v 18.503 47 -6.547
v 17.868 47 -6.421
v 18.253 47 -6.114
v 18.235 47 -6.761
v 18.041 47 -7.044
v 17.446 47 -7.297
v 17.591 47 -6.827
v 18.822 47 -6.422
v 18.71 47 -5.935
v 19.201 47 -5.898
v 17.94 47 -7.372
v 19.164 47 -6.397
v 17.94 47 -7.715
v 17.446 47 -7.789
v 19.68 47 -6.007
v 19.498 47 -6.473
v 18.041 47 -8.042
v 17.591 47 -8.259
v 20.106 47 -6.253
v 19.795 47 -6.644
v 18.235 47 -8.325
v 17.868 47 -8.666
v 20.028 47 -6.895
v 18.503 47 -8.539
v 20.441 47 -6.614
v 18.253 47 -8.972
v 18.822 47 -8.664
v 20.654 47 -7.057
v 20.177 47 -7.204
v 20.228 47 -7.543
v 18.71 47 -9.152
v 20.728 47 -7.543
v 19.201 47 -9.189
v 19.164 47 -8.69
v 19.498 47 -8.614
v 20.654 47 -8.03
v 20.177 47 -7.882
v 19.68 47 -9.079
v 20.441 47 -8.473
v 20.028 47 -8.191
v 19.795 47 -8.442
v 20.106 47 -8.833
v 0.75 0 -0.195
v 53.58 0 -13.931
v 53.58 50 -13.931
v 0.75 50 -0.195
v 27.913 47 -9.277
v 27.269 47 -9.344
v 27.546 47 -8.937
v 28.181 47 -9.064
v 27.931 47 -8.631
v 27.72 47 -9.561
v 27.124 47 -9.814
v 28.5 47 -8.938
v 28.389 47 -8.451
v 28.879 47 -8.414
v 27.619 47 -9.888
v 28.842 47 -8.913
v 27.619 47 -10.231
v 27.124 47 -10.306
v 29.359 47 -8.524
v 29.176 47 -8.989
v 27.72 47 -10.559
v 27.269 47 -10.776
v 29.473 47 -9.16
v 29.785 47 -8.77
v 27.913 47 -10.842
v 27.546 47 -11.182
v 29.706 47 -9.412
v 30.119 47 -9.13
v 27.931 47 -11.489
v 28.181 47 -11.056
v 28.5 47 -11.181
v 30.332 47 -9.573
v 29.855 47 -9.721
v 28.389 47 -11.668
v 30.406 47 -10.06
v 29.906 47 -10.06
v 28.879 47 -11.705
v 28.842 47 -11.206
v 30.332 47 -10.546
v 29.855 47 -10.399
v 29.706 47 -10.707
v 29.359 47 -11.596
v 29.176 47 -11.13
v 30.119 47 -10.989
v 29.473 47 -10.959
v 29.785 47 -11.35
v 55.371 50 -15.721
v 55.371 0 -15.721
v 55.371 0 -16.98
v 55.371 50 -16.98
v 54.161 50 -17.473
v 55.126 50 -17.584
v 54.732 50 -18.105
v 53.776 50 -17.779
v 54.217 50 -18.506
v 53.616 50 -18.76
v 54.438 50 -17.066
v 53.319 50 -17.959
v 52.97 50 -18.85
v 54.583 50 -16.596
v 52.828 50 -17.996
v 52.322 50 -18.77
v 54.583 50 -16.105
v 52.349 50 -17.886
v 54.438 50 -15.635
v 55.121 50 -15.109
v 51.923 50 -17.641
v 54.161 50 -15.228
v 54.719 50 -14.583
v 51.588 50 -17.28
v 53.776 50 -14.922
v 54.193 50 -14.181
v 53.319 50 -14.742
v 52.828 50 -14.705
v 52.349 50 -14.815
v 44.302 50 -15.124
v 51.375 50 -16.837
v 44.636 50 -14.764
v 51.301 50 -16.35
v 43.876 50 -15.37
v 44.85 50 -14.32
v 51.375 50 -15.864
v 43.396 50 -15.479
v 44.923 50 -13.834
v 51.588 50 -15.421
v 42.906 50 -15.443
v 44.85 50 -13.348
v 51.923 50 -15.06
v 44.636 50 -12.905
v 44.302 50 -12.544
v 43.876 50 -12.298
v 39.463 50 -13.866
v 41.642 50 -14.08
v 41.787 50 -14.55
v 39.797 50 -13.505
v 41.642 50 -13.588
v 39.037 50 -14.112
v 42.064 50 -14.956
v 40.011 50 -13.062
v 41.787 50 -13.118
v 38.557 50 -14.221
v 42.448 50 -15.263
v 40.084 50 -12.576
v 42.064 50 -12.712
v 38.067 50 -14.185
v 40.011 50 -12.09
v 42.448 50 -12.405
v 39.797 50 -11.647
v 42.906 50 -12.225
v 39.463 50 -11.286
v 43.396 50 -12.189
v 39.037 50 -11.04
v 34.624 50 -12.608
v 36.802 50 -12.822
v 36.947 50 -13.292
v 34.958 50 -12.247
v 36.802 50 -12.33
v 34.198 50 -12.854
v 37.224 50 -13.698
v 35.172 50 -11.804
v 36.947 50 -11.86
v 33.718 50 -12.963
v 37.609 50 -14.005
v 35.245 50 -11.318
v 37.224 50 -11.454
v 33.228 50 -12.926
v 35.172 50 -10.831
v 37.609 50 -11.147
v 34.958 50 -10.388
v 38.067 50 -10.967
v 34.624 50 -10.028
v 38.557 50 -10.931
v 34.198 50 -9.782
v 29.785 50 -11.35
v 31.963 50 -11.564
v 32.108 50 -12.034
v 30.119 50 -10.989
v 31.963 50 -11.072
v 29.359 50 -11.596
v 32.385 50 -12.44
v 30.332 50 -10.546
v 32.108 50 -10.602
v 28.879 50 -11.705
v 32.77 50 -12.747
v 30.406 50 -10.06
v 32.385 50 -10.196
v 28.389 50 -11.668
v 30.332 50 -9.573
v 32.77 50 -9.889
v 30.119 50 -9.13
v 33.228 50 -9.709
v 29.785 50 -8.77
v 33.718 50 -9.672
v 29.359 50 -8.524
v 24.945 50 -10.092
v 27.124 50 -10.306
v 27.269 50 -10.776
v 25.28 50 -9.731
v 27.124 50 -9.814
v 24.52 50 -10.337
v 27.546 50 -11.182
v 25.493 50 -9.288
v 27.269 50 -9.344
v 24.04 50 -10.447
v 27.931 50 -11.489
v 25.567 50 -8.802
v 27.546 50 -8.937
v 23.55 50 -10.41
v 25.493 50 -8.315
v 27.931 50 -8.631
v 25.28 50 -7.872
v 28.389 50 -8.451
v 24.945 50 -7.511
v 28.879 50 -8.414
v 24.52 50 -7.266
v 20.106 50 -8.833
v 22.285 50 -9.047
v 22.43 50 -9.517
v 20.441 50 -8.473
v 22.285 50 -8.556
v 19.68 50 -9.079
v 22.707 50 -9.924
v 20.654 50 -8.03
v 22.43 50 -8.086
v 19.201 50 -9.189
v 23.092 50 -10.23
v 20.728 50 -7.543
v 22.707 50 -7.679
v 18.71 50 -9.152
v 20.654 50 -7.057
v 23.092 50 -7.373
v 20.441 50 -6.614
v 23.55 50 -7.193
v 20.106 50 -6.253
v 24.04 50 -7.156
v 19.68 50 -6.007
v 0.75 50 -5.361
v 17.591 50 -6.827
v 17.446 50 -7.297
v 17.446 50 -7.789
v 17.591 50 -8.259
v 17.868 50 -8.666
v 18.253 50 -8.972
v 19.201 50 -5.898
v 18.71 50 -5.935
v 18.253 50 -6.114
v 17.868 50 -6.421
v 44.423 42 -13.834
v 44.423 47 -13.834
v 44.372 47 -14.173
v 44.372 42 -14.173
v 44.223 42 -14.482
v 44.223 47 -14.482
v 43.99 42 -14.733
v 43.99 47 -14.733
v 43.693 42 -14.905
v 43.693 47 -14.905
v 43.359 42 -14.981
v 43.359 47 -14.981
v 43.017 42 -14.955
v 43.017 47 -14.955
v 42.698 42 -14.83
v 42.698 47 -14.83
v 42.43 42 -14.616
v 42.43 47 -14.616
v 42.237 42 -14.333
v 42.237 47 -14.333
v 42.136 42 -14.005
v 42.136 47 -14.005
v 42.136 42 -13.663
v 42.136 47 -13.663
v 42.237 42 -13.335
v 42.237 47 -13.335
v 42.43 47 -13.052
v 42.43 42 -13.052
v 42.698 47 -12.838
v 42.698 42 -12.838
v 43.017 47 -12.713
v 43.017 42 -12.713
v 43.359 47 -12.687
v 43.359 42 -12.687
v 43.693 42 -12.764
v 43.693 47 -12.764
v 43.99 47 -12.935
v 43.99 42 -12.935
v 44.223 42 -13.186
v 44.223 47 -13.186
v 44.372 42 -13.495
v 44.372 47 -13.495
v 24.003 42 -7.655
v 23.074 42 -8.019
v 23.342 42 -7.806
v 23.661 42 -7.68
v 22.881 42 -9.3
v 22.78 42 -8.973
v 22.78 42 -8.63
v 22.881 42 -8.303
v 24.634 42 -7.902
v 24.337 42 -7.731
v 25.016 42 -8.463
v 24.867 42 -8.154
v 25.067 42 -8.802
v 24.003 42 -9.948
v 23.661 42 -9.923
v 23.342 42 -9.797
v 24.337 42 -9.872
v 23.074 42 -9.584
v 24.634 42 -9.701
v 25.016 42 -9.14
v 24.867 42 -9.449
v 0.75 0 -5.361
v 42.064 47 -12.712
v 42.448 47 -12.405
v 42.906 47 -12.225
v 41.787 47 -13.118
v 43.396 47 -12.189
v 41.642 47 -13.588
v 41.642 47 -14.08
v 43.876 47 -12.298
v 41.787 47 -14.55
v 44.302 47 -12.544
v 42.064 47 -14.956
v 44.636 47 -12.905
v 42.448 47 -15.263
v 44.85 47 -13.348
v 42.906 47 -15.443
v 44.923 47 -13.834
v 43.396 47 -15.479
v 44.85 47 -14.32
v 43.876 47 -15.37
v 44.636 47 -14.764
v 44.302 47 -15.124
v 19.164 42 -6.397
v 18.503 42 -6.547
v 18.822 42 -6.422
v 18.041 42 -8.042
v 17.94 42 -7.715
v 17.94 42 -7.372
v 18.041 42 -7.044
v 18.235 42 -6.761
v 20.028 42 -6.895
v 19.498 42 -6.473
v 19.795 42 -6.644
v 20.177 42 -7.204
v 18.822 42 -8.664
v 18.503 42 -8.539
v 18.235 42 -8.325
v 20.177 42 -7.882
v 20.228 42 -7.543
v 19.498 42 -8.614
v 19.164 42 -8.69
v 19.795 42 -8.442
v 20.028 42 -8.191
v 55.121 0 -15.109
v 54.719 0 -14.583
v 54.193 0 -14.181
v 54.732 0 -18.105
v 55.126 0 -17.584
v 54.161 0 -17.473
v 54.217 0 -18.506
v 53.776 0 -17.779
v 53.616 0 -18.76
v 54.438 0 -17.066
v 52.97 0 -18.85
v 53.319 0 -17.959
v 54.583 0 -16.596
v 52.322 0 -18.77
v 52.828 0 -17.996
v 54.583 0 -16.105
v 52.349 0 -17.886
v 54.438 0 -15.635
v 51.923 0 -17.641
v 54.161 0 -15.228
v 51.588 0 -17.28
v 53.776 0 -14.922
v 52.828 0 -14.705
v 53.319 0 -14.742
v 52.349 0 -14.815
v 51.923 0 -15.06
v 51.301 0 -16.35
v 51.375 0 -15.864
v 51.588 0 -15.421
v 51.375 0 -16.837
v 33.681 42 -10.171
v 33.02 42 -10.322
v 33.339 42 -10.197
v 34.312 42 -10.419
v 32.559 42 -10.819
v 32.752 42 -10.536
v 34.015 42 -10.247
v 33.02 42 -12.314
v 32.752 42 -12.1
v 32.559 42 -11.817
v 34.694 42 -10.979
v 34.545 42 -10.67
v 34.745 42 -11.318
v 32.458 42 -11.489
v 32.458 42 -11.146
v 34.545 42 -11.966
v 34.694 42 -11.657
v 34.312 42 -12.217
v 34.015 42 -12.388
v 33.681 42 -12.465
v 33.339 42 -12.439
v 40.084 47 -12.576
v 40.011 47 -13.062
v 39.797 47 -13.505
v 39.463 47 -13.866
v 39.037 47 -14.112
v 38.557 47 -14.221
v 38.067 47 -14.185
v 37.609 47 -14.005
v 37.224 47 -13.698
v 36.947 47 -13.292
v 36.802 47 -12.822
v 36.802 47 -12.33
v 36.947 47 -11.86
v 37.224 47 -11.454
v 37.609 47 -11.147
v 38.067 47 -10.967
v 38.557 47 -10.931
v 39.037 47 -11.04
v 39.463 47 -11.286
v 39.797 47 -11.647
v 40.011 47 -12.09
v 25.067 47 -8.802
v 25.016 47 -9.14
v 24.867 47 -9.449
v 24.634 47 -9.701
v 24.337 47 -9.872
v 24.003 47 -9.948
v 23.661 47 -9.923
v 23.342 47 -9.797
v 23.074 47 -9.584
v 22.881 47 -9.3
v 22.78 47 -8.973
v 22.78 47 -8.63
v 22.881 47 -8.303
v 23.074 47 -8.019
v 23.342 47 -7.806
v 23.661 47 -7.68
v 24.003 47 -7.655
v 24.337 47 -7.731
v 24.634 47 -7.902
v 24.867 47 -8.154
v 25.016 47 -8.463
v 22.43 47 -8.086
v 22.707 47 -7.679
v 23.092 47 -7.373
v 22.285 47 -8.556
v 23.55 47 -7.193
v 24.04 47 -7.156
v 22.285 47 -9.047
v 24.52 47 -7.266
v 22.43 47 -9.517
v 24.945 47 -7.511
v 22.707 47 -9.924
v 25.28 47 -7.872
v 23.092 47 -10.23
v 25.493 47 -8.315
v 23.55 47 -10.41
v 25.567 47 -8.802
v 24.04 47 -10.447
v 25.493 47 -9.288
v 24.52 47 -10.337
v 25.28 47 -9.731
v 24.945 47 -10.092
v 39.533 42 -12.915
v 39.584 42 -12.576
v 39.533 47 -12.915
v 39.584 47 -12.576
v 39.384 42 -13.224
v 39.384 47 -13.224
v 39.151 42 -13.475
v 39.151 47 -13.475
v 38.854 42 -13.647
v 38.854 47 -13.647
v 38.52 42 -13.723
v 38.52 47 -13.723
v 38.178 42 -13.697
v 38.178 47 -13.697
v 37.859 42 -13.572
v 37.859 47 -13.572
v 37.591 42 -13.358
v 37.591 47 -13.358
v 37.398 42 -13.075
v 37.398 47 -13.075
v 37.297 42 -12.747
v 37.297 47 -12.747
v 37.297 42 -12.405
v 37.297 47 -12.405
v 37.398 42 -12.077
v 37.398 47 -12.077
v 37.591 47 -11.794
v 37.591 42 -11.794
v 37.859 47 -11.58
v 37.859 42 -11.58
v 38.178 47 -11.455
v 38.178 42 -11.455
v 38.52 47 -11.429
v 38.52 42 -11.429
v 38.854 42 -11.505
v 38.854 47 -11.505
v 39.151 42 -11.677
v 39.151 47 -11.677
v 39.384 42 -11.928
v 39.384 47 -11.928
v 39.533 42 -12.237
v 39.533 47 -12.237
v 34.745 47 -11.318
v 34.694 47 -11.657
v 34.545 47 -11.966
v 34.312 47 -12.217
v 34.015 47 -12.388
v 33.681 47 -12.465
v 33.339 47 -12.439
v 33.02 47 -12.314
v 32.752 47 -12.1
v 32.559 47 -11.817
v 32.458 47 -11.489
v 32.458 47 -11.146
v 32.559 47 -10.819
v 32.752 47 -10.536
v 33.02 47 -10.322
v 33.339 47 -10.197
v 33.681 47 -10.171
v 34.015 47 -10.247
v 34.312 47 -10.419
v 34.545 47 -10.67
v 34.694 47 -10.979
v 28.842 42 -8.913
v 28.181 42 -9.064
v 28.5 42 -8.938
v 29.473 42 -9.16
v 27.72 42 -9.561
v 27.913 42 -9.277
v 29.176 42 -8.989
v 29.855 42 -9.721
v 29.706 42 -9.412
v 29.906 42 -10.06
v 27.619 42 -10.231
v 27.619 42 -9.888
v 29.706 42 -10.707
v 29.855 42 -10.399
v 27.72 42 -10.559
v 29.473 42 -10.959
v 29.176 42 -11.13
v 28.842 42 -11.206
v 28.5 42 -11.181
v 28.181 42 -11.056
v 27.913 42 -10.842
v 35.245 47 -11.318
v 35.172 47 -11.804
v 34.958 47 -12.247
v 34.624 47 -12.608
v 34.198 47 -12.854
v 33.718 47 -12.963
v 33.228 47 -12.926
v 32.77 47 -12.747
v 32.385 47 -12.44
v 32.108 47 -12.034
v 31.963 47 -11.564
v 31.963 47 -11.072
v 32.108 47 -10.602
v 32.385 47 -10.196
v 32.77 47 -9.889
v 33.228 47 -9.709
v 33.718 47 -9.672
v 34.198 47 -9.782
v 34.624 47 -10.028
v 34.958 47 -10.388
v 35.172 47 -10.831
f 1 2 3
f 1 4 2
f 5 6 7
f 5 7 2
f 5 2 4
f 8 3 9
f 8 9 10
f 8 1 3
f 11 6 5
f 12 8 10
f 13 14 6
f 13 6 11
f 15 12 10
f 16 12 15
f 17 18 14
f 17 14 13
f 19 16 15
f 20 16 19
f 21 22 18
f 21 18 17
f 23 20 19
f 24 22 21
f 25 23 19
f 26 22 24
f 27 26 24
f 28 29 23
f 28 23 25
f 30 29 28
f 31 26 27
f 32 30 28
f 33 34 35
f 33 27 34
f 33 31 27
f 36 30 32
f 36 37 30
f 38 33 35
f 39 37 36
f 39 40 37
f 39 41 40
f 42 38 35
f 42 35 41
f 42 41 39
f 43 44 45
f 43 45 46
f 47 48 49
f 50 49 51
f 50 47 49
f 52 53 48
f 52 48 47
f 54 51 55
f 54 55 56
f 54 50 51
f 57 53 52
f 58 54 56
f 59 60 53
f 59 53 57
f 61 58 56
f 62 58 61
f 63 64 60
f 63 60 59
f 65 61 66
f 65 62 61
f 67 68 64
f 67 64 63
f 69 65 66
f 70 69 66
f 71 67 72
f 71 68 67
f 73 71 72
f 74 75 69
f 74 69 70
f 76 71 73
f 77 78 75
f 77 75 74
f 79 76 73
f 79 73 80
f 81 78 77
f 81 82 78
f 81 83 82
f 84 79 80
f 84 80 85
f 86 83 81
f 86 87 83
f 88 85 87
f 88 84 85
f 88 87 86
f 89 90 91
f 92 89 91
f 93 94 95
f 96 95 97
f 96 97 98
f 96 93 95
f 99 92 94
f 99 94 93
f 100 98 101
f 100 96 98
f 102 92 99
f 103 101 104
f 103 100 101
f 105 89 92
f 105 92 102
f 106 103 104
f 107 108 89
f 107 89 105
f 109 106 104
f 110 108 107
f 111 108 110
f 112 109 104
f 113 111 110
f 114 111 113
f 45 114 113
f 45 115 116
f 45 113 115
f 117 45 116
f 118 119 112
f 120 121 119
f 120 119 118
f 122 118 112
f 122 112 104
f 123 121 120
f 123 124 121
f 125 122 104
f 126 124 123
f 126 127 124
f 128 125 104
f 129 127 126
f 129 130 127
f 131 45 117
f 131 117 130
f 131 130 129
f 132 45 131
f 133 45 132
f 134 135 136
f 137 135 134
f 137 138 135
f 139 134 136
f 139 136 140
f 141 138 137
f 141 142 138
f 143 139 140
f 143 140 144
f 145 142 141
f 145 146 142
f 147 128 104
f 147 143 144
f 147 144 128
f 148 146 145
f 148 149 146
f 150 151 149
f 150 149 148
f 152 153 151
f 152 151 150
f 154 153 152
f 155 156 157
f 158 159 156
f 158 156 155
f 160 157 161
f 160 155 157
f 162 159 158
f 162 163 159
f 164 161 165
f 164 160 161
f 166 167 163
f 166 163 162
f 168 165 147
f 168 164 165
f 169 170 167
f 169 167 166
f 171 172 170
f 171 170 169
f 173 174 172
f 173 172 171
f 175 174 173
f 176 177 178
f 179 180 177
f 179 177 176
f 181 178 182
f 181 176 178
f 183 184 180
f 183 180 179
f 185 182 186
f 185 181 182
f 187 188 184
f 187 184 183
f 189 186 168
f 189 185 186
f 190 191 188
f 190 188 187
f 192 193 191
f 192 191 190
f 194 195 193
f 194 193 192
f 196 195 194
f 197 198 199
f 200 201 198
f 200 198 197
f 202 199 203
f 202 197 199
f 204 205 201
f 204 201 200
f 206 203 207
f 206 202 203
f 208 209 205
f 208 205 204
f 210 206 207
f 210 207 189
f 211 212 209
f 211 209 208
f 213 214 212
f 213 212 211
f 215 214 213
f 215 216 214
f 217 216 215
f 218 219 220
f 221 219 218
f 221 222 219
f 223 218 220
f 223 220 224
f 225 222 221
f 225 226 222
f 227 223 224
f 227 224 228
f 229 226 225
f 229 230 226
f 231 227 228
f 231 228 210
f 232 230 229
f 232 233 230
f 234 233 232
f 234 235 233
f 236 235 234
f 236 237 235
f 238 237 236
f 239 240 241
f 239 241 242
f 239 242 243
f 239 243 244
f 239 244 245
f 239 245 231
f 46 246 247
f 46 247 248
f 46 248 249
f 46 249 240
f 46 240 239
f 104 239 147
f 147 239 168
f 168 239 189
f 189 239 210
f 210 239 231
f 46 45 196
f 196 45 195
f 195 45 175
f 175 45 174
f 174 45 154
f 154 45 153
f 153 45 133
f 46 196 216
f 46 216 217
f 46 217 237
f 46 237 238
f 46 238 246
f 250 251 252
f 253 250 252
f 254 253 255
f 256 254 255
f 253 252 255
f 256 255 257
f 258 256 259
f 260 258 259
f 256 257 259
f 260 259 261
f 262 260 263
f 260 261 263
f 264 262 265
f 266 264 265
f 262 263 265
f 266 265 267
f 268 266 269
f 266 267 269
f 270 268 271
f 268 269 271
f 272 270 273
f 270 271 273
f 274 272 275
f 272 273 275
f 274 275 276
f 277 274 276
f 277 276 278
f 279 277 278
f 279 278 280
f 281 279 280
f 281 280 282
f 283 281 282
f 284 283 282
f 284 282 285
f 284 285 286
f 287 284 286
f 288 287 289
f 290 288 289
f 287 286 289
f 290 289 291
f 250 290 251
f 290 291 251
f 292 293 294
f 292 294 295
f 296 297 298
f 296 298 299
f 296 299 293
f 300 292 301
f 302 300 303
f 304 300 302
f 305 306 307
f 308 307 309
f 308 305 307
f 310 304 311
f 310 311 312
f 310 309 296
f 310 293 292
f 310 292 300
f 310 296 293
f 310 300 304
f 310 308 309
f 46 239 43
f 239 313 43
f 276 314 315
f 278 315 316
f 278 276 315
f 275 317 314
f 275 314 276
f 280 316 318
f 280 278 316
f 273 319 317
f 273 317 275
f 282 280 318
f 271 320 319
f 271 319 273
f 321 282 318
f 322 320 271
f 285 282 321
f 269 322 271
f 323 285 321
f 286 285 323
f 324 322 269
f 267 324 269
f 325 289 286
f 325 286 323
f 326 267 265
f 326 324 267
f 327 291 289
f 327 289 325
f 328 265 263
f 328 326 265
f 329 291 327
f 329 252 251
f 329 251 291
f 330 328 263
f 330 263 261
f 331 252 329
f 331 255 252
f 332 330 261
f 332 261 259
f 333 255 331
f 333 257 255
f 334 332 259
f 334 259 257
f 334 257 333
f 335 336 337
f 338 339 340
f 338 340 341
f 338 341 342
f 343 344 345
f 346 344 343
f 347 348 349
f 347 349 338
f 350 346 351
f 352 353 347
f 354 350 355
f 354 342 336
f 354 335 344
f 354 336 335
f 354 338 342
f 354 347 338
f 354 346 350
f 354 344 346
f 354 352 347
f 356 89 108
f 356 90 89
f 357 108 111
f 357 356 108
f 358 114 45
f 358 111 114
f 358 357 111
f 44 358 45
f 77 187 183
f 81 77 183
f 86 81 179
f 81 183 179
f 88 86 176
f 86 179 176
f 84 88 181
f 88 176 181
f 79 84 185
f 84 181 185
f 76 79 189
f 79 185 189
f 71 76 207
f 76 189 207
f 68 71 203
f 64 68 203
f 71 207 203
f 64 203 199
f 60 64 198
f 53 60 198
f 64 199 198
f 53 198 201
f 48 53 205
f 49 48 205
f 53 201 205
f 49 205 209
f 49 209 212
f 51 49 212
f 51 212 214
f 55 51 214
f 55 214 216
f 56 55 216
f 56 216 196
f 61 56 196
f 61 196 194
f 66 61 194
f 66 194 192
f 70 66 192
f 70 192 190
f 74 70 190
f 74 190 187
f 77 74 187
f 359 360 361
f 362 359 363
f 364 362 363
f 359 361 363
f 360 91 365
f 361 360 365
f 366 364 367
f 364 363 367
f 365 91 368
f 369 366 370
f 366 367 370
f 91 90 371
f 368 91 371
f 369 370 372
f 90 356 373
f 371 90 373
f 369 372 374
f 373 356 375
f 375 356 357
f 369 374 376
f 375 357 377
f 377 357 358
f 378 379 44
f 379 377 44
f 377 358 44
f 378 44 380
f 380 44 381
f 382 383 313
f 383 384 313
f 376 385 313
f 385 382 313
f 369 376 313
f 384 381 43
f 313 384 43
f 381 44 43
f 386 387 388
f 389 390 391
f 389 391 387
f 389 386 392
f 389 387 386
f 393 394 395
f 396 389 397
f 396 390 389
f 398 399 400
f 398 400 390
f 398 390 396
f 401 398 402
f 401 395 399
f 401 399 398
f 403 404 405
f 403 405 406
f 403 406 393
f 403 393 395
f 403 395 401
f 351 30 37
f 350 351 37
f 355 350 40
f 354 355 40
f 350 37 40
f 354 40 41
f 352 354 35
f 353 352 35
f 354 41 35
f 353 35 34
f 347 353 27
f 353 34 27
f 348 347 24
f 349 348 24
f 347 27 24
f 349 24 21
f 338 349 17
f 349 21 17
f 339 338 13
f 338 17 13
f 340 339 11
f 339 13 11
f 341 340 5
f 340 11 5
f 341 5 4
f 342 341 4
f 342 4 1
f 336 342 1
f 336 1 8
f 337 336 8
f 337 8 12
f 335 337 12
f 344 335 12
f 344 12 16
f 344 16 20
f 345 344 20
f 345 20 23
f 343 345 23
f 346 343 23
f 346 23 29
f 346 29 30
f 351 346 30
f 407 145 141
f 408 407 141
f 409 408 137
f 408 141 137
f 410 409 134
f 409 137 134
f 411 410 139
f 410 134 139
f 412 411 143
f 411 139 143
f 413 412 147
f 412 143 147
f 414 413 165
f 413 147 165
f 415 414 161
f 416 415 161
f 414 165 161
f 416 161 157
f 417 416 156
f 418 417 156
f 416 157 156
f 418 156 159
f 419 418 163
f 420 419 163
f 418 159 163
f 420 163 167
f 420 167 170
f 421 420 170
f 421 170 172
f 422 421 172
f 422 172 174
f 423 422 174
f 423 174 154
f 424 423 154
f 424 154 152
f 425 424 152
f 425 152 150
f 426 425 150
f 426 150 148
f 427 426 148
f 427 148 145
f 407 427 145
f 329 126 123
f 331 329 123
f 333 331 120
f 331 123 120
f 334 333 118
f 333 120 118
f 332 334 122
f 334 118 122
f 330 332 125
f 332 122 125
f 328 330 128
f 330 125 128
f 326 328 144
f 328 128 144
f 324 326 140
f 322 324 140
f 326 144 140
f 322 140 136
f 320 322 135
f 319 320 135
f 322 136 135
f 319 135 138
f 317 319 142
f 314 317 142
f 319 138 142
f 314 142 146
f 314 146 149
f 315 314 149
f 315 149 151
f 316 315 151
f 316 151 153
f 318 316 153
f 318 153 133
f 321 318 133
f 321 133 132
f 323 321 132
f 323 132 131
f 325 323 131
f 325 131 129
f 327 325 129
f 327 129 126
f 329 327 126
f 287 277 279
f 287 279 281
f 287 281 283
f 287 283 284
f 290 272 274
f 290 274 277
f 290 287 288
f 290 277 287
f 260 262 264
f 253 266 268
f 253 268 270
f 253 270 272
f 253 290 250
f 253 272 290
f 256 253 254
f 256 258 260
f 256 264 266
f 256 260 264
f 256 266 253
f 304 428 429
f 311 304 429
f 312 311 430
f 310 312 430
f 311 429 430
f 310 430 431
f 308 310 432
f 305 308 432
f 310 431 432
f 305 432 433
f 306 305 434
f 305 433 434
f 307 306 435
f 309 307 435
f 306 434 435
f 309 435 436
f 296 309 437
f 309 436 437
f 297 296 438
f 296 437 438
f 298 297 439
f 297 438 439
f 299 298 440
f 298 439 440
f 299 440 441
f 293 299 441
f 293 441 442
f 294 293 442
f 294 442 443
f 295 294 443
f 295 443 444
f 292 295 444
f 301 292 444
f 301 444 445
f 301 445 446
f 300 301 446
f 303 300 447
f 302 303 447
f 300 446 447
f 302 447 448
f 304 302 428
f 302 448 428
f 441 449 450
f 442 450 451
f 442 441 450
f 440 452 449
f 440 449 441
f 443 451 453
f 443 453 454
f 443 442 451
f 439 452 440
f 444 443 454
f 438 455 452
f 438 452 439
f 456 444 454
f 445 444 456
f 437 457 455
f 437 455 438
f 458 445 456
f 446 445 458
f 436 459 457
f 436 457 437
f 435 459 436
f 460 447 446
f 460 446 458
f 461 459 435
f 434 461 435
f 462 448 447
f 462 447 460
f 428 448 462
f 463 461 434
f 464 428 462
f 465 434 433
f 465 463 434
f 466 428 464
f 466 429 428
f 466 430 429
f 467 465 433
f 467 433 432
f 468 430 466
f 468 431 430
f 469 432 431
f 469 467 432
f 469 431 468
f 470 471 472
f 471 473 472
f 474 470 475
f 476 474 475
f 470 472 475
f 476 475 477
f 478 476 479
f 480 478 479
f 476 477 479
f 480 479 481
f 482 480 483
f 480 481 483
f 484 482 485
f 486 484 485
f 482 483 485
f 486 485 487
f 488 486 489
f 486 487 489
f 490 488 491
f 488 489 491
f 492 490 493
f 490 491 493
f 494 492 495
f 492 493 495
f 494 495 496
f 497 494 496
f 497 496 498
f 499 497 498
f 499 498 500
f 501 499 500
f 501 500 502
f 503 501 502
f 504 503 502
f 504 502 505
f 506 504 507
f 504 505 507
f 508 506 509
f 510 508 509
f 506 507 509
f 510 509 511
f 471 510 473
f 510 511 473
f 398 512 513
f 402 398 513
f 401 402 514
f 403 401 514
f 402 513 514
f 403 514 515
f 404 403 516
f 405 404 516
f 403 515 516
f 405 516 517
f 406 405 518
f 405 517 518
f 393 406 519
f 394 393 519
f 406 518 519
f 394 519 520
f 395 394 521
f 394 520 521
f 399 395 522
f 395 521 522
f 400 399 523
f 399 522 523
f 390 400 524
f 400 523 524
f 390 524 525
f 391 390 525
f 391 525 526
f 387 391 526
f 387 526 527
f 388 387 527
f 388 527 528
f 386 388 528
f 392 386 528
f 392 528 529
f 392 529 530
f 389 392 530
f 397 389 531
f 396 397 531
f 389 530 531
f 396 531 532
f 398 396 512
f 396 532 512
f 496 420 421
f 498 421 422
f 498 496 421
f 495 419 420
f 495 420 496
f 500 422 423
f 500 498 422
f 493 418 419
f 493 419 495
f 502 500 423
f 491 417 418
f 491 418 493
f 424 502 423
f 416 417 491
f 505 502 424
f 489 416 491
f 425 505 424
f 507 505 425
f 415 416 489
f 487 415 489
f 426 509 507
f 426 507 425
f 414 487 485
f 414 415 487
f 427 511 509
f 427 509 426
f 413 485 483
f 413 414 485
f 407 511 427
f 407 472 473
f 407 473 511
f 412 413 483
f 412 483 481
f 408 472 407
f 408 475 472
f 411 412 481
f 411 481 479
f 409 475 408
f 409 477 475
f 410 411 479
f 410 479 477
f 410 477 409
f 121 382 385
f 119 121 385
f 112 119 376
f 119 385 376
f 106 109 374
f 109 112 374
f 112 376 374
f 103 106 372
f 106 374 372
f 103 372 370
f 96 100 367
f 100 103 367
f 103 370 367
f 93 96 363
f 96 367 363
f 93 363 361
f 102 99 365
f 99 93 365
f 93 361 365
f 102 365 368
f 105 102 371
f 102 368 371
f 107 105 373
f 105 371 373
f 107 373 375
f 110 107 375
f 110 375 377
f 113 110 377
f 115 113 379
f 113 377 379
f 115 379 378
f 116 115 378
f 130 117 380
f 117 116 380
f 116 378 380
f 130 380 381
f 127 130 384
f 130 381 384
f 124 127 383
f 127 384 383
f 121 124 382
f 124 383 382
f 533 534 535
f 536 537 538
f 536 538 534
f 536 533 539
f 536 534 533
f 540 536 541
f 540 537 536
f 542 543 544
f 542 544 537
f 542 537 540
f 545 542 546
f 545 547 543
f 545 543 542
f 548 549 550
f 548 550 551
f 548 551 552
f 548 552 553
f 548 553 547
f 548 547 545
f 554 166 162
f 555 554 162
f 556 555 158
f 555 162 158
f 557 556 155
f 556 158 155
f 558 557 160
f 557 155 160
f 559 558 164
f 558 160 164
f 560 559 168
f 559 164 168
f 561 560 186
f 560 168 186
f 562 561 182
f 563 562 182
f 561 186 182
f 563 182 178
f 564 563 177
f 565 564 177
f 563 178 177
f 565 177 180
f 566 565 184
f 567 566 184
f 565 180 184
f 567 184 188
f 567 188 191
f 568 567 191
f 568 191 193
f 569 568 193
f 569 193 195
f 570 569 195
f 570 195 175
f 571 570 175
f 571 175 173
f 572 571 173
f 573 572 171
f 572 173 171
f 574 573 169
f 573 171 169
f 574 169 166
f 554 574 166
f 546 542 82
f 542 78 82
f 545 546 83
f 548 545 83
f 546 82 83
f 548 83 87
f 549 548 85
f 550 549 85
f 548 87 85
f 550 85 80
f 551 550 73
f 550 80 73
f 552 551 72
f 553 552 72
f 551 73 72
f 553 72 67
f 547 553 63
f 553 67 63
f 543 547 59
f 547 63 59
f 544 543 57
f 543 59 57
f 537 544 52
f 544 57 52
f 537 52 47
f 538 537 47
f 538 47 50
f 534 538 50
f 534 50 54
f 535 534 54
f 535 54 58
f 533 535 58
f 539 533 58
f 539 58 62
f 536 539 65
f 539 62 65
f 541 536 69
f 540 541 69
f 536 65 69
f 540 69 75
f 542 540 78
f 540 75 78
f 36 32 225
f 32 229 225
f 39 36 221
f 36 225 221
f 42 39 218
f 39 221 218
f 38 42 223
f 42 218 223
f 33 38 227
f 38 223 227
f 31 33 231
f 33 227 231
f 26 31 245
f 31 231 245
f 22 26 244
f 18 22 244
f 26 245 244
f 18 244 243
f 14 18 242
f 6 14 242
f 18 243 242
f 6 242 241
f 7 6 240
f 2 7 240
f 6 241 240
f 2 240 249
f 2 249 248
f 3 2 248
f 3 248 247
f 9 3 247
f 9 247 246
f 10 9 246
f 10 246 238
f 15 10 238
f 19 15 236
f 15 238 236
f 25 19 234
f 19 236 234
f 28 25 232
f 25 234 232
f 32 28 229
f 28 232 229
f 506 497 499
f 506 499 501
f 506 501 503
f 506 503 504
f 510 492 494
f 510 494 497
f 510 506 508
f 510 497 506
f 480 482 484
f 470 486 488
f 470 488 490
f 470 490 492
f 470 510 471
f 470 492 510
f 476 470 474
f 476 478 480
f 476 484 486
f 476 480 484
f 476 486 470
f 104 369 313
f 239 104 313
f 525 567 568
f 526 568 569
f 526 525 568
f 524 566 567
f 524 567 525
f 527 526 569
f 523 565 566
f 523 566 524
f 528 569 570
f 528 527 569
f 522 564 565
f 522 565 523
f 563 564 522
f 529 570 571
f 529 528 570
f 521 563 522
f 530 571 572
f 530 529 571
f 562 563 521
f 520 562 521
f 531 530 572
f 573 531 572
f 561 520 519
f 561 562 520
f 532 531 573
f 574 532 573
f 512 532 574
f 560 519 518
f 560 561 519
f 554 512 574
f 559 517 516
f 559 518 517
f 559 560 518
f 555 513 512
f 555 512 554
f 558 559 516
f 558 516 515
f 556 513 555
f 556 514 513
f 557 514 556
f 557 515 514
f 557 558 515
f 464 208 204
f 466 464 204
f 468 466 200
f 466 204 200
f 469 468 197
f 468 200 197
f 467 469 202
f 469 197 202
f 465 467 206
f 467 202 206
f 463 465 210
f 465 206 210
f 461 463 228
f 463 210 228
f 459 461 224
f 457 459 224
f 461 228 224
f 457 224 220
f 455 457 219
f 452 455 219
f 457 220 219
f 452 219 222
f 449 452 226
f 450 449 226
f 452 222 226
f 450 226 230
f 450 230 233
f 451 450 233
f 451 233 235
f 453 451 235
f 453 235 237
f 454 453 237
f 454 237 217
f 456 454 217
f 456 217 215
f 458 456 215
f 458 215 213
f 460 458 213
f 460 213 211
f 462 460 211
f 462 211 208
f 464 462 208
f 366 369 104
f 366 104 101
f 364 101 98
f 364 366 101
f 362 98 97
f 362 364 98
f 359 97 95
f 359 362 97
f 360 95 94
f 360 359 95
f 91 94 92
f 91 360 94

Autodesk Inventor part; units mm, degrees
ref_plane "YZ Plane" through (0, 0, 0) normal (1, 0, 0) x (0, 1, 0)
ref_plane "XZ Plane" through (0, 0, 0) normal (0, 1, 0) x (-1, 0, 0)
ref_plane "XY Plane" through (0, 0, 0) normal (0, 0, 1) x (1, 0, 0)
sketch "Эскиз1" plane through (0, 0, 0) normal (0, 1, 0) x (-1, 0, 0)
  line L0 (-53.5804, -13.9309) -> (-0.75, -0.195)
  line L1 (-52.3223, -18.77) -> (-0.75, -5.3612)
  line L2 (-55.3709, -15.7214) -> (-55.3709, -16.9796)
  circle A0 centre (-52.9514, -16.3505) radius 1.65
  line L3 (-0.75, -5.3612) -> (-0.75, -0.195)
  arc A1 (-55.3709, -16.9796) -> (-52.3223, -18.77) centre (-52.9514, -16.3505) ccw
  arc A2 (-53.5804, -13.9309) -> (-55.3709, -15.7214) centre (-52.9514, -16.3505) ccw
  point P0 (0, 0)
extrude "Выдавливание1" add sketch "Эскиз1" along normal blind 50
sketch "Эскиз24" plane through (0, 50, 0) normal (0, 1, 0) x (1, 0, 0)
  circle A0 centre (52.9514, 16.3505) radius 1.65 projected
  line L0 (52.9514, 16.3505) -> (43.2731, 13.8341)
  circle A1 centre (43.2731, 13.8341) radius 1.65
  circle A2 centre (38.434, 12.576) radius 1.65
  line L1 (48.1122, 15.0923) -> (38.434, 12.576)
  circle A3 centre (33.5949, 11.3178) radius 1.65
  line L2 (43.2731, 13.8341) -> (33.5949, 11.3178)
  circle A4 centre (28.7558, 10.0596) radius 1.65
  line L3 (38.434, 12.576) -> (28.7558, 10.0596)
  circle A5 centre (23.9167, 8.8015) radius 1.65
  line L4 (33.5949, 11.3178) -> (23.9167, 8.8015)
  circle A6 centre (19.0776, 7.5433) radius 1.65
  line L5 (28.7558, 10.0596) -> (19.0776, 7.5433)
  point P0 (0, 0)
  dimension "d126" = 3.3
  dimension "d129" = 5
extrude "Выдавливание24" cut sketch "Эскиз24" against normal blind 3 contours A6 | A5 L5 L4 | L4 L5 A5 | A4 L4 L3 | L3 L4 A4 | A3 L3 L2 | L2 L3 A3 | A2 L2 L1 | L1 L2 A2 | A1 L1 L0 | L0 L1 A1
sketch "Эскиз25" plane through (19.0776, 47, -7.5433) normal (0, 1, 0) x (1, 0, 0)
  circle A0 centre (0, 0) radius 1.65 projected
  circle A1 centre (0, 0) radius 1.15
  circle A2 centre (4.8391, 1.2582) radius 1.65 projected
  circle A3 centre (4.8391, 1.2582) radius 1.15
  circle A4 centre (9.6782, 2.5163) radius 1.65 projected
  circle A5 centre (9.6782, 2.5163) radius 1.15
  circle A6 centre (14.5173, 3.7745) radius 1.65 projected
  circle A7 centre (14.5173, 3.7745) radius 1.15
  circle A8 centre (19.3565, 5.0327) radius 1.65 projected
  circle A9 centre (19.3565, 5.0327) radius 1.15
  circle A10 centre (24.1956, 6.2908) radius 1.65 projected
  circle A11 centre (24.1956, 6.2908) radius 1.15
  point P0 (-19.0776, -7.5433)
  dimension "d136" = 2.3
  dimension "d137" = 2.3
  dimension "d138" = 2.3
  dimension "d139" = 2.3
  dimension "d140" = 2.3
  dimension "d141" = 2.3
extrude "Выдавливание25" cut sketch "Эскиз25" against normal blind 5 contours A1 | A3 | A5 | A7 | A9 | A11
properties part number "only_gate"
